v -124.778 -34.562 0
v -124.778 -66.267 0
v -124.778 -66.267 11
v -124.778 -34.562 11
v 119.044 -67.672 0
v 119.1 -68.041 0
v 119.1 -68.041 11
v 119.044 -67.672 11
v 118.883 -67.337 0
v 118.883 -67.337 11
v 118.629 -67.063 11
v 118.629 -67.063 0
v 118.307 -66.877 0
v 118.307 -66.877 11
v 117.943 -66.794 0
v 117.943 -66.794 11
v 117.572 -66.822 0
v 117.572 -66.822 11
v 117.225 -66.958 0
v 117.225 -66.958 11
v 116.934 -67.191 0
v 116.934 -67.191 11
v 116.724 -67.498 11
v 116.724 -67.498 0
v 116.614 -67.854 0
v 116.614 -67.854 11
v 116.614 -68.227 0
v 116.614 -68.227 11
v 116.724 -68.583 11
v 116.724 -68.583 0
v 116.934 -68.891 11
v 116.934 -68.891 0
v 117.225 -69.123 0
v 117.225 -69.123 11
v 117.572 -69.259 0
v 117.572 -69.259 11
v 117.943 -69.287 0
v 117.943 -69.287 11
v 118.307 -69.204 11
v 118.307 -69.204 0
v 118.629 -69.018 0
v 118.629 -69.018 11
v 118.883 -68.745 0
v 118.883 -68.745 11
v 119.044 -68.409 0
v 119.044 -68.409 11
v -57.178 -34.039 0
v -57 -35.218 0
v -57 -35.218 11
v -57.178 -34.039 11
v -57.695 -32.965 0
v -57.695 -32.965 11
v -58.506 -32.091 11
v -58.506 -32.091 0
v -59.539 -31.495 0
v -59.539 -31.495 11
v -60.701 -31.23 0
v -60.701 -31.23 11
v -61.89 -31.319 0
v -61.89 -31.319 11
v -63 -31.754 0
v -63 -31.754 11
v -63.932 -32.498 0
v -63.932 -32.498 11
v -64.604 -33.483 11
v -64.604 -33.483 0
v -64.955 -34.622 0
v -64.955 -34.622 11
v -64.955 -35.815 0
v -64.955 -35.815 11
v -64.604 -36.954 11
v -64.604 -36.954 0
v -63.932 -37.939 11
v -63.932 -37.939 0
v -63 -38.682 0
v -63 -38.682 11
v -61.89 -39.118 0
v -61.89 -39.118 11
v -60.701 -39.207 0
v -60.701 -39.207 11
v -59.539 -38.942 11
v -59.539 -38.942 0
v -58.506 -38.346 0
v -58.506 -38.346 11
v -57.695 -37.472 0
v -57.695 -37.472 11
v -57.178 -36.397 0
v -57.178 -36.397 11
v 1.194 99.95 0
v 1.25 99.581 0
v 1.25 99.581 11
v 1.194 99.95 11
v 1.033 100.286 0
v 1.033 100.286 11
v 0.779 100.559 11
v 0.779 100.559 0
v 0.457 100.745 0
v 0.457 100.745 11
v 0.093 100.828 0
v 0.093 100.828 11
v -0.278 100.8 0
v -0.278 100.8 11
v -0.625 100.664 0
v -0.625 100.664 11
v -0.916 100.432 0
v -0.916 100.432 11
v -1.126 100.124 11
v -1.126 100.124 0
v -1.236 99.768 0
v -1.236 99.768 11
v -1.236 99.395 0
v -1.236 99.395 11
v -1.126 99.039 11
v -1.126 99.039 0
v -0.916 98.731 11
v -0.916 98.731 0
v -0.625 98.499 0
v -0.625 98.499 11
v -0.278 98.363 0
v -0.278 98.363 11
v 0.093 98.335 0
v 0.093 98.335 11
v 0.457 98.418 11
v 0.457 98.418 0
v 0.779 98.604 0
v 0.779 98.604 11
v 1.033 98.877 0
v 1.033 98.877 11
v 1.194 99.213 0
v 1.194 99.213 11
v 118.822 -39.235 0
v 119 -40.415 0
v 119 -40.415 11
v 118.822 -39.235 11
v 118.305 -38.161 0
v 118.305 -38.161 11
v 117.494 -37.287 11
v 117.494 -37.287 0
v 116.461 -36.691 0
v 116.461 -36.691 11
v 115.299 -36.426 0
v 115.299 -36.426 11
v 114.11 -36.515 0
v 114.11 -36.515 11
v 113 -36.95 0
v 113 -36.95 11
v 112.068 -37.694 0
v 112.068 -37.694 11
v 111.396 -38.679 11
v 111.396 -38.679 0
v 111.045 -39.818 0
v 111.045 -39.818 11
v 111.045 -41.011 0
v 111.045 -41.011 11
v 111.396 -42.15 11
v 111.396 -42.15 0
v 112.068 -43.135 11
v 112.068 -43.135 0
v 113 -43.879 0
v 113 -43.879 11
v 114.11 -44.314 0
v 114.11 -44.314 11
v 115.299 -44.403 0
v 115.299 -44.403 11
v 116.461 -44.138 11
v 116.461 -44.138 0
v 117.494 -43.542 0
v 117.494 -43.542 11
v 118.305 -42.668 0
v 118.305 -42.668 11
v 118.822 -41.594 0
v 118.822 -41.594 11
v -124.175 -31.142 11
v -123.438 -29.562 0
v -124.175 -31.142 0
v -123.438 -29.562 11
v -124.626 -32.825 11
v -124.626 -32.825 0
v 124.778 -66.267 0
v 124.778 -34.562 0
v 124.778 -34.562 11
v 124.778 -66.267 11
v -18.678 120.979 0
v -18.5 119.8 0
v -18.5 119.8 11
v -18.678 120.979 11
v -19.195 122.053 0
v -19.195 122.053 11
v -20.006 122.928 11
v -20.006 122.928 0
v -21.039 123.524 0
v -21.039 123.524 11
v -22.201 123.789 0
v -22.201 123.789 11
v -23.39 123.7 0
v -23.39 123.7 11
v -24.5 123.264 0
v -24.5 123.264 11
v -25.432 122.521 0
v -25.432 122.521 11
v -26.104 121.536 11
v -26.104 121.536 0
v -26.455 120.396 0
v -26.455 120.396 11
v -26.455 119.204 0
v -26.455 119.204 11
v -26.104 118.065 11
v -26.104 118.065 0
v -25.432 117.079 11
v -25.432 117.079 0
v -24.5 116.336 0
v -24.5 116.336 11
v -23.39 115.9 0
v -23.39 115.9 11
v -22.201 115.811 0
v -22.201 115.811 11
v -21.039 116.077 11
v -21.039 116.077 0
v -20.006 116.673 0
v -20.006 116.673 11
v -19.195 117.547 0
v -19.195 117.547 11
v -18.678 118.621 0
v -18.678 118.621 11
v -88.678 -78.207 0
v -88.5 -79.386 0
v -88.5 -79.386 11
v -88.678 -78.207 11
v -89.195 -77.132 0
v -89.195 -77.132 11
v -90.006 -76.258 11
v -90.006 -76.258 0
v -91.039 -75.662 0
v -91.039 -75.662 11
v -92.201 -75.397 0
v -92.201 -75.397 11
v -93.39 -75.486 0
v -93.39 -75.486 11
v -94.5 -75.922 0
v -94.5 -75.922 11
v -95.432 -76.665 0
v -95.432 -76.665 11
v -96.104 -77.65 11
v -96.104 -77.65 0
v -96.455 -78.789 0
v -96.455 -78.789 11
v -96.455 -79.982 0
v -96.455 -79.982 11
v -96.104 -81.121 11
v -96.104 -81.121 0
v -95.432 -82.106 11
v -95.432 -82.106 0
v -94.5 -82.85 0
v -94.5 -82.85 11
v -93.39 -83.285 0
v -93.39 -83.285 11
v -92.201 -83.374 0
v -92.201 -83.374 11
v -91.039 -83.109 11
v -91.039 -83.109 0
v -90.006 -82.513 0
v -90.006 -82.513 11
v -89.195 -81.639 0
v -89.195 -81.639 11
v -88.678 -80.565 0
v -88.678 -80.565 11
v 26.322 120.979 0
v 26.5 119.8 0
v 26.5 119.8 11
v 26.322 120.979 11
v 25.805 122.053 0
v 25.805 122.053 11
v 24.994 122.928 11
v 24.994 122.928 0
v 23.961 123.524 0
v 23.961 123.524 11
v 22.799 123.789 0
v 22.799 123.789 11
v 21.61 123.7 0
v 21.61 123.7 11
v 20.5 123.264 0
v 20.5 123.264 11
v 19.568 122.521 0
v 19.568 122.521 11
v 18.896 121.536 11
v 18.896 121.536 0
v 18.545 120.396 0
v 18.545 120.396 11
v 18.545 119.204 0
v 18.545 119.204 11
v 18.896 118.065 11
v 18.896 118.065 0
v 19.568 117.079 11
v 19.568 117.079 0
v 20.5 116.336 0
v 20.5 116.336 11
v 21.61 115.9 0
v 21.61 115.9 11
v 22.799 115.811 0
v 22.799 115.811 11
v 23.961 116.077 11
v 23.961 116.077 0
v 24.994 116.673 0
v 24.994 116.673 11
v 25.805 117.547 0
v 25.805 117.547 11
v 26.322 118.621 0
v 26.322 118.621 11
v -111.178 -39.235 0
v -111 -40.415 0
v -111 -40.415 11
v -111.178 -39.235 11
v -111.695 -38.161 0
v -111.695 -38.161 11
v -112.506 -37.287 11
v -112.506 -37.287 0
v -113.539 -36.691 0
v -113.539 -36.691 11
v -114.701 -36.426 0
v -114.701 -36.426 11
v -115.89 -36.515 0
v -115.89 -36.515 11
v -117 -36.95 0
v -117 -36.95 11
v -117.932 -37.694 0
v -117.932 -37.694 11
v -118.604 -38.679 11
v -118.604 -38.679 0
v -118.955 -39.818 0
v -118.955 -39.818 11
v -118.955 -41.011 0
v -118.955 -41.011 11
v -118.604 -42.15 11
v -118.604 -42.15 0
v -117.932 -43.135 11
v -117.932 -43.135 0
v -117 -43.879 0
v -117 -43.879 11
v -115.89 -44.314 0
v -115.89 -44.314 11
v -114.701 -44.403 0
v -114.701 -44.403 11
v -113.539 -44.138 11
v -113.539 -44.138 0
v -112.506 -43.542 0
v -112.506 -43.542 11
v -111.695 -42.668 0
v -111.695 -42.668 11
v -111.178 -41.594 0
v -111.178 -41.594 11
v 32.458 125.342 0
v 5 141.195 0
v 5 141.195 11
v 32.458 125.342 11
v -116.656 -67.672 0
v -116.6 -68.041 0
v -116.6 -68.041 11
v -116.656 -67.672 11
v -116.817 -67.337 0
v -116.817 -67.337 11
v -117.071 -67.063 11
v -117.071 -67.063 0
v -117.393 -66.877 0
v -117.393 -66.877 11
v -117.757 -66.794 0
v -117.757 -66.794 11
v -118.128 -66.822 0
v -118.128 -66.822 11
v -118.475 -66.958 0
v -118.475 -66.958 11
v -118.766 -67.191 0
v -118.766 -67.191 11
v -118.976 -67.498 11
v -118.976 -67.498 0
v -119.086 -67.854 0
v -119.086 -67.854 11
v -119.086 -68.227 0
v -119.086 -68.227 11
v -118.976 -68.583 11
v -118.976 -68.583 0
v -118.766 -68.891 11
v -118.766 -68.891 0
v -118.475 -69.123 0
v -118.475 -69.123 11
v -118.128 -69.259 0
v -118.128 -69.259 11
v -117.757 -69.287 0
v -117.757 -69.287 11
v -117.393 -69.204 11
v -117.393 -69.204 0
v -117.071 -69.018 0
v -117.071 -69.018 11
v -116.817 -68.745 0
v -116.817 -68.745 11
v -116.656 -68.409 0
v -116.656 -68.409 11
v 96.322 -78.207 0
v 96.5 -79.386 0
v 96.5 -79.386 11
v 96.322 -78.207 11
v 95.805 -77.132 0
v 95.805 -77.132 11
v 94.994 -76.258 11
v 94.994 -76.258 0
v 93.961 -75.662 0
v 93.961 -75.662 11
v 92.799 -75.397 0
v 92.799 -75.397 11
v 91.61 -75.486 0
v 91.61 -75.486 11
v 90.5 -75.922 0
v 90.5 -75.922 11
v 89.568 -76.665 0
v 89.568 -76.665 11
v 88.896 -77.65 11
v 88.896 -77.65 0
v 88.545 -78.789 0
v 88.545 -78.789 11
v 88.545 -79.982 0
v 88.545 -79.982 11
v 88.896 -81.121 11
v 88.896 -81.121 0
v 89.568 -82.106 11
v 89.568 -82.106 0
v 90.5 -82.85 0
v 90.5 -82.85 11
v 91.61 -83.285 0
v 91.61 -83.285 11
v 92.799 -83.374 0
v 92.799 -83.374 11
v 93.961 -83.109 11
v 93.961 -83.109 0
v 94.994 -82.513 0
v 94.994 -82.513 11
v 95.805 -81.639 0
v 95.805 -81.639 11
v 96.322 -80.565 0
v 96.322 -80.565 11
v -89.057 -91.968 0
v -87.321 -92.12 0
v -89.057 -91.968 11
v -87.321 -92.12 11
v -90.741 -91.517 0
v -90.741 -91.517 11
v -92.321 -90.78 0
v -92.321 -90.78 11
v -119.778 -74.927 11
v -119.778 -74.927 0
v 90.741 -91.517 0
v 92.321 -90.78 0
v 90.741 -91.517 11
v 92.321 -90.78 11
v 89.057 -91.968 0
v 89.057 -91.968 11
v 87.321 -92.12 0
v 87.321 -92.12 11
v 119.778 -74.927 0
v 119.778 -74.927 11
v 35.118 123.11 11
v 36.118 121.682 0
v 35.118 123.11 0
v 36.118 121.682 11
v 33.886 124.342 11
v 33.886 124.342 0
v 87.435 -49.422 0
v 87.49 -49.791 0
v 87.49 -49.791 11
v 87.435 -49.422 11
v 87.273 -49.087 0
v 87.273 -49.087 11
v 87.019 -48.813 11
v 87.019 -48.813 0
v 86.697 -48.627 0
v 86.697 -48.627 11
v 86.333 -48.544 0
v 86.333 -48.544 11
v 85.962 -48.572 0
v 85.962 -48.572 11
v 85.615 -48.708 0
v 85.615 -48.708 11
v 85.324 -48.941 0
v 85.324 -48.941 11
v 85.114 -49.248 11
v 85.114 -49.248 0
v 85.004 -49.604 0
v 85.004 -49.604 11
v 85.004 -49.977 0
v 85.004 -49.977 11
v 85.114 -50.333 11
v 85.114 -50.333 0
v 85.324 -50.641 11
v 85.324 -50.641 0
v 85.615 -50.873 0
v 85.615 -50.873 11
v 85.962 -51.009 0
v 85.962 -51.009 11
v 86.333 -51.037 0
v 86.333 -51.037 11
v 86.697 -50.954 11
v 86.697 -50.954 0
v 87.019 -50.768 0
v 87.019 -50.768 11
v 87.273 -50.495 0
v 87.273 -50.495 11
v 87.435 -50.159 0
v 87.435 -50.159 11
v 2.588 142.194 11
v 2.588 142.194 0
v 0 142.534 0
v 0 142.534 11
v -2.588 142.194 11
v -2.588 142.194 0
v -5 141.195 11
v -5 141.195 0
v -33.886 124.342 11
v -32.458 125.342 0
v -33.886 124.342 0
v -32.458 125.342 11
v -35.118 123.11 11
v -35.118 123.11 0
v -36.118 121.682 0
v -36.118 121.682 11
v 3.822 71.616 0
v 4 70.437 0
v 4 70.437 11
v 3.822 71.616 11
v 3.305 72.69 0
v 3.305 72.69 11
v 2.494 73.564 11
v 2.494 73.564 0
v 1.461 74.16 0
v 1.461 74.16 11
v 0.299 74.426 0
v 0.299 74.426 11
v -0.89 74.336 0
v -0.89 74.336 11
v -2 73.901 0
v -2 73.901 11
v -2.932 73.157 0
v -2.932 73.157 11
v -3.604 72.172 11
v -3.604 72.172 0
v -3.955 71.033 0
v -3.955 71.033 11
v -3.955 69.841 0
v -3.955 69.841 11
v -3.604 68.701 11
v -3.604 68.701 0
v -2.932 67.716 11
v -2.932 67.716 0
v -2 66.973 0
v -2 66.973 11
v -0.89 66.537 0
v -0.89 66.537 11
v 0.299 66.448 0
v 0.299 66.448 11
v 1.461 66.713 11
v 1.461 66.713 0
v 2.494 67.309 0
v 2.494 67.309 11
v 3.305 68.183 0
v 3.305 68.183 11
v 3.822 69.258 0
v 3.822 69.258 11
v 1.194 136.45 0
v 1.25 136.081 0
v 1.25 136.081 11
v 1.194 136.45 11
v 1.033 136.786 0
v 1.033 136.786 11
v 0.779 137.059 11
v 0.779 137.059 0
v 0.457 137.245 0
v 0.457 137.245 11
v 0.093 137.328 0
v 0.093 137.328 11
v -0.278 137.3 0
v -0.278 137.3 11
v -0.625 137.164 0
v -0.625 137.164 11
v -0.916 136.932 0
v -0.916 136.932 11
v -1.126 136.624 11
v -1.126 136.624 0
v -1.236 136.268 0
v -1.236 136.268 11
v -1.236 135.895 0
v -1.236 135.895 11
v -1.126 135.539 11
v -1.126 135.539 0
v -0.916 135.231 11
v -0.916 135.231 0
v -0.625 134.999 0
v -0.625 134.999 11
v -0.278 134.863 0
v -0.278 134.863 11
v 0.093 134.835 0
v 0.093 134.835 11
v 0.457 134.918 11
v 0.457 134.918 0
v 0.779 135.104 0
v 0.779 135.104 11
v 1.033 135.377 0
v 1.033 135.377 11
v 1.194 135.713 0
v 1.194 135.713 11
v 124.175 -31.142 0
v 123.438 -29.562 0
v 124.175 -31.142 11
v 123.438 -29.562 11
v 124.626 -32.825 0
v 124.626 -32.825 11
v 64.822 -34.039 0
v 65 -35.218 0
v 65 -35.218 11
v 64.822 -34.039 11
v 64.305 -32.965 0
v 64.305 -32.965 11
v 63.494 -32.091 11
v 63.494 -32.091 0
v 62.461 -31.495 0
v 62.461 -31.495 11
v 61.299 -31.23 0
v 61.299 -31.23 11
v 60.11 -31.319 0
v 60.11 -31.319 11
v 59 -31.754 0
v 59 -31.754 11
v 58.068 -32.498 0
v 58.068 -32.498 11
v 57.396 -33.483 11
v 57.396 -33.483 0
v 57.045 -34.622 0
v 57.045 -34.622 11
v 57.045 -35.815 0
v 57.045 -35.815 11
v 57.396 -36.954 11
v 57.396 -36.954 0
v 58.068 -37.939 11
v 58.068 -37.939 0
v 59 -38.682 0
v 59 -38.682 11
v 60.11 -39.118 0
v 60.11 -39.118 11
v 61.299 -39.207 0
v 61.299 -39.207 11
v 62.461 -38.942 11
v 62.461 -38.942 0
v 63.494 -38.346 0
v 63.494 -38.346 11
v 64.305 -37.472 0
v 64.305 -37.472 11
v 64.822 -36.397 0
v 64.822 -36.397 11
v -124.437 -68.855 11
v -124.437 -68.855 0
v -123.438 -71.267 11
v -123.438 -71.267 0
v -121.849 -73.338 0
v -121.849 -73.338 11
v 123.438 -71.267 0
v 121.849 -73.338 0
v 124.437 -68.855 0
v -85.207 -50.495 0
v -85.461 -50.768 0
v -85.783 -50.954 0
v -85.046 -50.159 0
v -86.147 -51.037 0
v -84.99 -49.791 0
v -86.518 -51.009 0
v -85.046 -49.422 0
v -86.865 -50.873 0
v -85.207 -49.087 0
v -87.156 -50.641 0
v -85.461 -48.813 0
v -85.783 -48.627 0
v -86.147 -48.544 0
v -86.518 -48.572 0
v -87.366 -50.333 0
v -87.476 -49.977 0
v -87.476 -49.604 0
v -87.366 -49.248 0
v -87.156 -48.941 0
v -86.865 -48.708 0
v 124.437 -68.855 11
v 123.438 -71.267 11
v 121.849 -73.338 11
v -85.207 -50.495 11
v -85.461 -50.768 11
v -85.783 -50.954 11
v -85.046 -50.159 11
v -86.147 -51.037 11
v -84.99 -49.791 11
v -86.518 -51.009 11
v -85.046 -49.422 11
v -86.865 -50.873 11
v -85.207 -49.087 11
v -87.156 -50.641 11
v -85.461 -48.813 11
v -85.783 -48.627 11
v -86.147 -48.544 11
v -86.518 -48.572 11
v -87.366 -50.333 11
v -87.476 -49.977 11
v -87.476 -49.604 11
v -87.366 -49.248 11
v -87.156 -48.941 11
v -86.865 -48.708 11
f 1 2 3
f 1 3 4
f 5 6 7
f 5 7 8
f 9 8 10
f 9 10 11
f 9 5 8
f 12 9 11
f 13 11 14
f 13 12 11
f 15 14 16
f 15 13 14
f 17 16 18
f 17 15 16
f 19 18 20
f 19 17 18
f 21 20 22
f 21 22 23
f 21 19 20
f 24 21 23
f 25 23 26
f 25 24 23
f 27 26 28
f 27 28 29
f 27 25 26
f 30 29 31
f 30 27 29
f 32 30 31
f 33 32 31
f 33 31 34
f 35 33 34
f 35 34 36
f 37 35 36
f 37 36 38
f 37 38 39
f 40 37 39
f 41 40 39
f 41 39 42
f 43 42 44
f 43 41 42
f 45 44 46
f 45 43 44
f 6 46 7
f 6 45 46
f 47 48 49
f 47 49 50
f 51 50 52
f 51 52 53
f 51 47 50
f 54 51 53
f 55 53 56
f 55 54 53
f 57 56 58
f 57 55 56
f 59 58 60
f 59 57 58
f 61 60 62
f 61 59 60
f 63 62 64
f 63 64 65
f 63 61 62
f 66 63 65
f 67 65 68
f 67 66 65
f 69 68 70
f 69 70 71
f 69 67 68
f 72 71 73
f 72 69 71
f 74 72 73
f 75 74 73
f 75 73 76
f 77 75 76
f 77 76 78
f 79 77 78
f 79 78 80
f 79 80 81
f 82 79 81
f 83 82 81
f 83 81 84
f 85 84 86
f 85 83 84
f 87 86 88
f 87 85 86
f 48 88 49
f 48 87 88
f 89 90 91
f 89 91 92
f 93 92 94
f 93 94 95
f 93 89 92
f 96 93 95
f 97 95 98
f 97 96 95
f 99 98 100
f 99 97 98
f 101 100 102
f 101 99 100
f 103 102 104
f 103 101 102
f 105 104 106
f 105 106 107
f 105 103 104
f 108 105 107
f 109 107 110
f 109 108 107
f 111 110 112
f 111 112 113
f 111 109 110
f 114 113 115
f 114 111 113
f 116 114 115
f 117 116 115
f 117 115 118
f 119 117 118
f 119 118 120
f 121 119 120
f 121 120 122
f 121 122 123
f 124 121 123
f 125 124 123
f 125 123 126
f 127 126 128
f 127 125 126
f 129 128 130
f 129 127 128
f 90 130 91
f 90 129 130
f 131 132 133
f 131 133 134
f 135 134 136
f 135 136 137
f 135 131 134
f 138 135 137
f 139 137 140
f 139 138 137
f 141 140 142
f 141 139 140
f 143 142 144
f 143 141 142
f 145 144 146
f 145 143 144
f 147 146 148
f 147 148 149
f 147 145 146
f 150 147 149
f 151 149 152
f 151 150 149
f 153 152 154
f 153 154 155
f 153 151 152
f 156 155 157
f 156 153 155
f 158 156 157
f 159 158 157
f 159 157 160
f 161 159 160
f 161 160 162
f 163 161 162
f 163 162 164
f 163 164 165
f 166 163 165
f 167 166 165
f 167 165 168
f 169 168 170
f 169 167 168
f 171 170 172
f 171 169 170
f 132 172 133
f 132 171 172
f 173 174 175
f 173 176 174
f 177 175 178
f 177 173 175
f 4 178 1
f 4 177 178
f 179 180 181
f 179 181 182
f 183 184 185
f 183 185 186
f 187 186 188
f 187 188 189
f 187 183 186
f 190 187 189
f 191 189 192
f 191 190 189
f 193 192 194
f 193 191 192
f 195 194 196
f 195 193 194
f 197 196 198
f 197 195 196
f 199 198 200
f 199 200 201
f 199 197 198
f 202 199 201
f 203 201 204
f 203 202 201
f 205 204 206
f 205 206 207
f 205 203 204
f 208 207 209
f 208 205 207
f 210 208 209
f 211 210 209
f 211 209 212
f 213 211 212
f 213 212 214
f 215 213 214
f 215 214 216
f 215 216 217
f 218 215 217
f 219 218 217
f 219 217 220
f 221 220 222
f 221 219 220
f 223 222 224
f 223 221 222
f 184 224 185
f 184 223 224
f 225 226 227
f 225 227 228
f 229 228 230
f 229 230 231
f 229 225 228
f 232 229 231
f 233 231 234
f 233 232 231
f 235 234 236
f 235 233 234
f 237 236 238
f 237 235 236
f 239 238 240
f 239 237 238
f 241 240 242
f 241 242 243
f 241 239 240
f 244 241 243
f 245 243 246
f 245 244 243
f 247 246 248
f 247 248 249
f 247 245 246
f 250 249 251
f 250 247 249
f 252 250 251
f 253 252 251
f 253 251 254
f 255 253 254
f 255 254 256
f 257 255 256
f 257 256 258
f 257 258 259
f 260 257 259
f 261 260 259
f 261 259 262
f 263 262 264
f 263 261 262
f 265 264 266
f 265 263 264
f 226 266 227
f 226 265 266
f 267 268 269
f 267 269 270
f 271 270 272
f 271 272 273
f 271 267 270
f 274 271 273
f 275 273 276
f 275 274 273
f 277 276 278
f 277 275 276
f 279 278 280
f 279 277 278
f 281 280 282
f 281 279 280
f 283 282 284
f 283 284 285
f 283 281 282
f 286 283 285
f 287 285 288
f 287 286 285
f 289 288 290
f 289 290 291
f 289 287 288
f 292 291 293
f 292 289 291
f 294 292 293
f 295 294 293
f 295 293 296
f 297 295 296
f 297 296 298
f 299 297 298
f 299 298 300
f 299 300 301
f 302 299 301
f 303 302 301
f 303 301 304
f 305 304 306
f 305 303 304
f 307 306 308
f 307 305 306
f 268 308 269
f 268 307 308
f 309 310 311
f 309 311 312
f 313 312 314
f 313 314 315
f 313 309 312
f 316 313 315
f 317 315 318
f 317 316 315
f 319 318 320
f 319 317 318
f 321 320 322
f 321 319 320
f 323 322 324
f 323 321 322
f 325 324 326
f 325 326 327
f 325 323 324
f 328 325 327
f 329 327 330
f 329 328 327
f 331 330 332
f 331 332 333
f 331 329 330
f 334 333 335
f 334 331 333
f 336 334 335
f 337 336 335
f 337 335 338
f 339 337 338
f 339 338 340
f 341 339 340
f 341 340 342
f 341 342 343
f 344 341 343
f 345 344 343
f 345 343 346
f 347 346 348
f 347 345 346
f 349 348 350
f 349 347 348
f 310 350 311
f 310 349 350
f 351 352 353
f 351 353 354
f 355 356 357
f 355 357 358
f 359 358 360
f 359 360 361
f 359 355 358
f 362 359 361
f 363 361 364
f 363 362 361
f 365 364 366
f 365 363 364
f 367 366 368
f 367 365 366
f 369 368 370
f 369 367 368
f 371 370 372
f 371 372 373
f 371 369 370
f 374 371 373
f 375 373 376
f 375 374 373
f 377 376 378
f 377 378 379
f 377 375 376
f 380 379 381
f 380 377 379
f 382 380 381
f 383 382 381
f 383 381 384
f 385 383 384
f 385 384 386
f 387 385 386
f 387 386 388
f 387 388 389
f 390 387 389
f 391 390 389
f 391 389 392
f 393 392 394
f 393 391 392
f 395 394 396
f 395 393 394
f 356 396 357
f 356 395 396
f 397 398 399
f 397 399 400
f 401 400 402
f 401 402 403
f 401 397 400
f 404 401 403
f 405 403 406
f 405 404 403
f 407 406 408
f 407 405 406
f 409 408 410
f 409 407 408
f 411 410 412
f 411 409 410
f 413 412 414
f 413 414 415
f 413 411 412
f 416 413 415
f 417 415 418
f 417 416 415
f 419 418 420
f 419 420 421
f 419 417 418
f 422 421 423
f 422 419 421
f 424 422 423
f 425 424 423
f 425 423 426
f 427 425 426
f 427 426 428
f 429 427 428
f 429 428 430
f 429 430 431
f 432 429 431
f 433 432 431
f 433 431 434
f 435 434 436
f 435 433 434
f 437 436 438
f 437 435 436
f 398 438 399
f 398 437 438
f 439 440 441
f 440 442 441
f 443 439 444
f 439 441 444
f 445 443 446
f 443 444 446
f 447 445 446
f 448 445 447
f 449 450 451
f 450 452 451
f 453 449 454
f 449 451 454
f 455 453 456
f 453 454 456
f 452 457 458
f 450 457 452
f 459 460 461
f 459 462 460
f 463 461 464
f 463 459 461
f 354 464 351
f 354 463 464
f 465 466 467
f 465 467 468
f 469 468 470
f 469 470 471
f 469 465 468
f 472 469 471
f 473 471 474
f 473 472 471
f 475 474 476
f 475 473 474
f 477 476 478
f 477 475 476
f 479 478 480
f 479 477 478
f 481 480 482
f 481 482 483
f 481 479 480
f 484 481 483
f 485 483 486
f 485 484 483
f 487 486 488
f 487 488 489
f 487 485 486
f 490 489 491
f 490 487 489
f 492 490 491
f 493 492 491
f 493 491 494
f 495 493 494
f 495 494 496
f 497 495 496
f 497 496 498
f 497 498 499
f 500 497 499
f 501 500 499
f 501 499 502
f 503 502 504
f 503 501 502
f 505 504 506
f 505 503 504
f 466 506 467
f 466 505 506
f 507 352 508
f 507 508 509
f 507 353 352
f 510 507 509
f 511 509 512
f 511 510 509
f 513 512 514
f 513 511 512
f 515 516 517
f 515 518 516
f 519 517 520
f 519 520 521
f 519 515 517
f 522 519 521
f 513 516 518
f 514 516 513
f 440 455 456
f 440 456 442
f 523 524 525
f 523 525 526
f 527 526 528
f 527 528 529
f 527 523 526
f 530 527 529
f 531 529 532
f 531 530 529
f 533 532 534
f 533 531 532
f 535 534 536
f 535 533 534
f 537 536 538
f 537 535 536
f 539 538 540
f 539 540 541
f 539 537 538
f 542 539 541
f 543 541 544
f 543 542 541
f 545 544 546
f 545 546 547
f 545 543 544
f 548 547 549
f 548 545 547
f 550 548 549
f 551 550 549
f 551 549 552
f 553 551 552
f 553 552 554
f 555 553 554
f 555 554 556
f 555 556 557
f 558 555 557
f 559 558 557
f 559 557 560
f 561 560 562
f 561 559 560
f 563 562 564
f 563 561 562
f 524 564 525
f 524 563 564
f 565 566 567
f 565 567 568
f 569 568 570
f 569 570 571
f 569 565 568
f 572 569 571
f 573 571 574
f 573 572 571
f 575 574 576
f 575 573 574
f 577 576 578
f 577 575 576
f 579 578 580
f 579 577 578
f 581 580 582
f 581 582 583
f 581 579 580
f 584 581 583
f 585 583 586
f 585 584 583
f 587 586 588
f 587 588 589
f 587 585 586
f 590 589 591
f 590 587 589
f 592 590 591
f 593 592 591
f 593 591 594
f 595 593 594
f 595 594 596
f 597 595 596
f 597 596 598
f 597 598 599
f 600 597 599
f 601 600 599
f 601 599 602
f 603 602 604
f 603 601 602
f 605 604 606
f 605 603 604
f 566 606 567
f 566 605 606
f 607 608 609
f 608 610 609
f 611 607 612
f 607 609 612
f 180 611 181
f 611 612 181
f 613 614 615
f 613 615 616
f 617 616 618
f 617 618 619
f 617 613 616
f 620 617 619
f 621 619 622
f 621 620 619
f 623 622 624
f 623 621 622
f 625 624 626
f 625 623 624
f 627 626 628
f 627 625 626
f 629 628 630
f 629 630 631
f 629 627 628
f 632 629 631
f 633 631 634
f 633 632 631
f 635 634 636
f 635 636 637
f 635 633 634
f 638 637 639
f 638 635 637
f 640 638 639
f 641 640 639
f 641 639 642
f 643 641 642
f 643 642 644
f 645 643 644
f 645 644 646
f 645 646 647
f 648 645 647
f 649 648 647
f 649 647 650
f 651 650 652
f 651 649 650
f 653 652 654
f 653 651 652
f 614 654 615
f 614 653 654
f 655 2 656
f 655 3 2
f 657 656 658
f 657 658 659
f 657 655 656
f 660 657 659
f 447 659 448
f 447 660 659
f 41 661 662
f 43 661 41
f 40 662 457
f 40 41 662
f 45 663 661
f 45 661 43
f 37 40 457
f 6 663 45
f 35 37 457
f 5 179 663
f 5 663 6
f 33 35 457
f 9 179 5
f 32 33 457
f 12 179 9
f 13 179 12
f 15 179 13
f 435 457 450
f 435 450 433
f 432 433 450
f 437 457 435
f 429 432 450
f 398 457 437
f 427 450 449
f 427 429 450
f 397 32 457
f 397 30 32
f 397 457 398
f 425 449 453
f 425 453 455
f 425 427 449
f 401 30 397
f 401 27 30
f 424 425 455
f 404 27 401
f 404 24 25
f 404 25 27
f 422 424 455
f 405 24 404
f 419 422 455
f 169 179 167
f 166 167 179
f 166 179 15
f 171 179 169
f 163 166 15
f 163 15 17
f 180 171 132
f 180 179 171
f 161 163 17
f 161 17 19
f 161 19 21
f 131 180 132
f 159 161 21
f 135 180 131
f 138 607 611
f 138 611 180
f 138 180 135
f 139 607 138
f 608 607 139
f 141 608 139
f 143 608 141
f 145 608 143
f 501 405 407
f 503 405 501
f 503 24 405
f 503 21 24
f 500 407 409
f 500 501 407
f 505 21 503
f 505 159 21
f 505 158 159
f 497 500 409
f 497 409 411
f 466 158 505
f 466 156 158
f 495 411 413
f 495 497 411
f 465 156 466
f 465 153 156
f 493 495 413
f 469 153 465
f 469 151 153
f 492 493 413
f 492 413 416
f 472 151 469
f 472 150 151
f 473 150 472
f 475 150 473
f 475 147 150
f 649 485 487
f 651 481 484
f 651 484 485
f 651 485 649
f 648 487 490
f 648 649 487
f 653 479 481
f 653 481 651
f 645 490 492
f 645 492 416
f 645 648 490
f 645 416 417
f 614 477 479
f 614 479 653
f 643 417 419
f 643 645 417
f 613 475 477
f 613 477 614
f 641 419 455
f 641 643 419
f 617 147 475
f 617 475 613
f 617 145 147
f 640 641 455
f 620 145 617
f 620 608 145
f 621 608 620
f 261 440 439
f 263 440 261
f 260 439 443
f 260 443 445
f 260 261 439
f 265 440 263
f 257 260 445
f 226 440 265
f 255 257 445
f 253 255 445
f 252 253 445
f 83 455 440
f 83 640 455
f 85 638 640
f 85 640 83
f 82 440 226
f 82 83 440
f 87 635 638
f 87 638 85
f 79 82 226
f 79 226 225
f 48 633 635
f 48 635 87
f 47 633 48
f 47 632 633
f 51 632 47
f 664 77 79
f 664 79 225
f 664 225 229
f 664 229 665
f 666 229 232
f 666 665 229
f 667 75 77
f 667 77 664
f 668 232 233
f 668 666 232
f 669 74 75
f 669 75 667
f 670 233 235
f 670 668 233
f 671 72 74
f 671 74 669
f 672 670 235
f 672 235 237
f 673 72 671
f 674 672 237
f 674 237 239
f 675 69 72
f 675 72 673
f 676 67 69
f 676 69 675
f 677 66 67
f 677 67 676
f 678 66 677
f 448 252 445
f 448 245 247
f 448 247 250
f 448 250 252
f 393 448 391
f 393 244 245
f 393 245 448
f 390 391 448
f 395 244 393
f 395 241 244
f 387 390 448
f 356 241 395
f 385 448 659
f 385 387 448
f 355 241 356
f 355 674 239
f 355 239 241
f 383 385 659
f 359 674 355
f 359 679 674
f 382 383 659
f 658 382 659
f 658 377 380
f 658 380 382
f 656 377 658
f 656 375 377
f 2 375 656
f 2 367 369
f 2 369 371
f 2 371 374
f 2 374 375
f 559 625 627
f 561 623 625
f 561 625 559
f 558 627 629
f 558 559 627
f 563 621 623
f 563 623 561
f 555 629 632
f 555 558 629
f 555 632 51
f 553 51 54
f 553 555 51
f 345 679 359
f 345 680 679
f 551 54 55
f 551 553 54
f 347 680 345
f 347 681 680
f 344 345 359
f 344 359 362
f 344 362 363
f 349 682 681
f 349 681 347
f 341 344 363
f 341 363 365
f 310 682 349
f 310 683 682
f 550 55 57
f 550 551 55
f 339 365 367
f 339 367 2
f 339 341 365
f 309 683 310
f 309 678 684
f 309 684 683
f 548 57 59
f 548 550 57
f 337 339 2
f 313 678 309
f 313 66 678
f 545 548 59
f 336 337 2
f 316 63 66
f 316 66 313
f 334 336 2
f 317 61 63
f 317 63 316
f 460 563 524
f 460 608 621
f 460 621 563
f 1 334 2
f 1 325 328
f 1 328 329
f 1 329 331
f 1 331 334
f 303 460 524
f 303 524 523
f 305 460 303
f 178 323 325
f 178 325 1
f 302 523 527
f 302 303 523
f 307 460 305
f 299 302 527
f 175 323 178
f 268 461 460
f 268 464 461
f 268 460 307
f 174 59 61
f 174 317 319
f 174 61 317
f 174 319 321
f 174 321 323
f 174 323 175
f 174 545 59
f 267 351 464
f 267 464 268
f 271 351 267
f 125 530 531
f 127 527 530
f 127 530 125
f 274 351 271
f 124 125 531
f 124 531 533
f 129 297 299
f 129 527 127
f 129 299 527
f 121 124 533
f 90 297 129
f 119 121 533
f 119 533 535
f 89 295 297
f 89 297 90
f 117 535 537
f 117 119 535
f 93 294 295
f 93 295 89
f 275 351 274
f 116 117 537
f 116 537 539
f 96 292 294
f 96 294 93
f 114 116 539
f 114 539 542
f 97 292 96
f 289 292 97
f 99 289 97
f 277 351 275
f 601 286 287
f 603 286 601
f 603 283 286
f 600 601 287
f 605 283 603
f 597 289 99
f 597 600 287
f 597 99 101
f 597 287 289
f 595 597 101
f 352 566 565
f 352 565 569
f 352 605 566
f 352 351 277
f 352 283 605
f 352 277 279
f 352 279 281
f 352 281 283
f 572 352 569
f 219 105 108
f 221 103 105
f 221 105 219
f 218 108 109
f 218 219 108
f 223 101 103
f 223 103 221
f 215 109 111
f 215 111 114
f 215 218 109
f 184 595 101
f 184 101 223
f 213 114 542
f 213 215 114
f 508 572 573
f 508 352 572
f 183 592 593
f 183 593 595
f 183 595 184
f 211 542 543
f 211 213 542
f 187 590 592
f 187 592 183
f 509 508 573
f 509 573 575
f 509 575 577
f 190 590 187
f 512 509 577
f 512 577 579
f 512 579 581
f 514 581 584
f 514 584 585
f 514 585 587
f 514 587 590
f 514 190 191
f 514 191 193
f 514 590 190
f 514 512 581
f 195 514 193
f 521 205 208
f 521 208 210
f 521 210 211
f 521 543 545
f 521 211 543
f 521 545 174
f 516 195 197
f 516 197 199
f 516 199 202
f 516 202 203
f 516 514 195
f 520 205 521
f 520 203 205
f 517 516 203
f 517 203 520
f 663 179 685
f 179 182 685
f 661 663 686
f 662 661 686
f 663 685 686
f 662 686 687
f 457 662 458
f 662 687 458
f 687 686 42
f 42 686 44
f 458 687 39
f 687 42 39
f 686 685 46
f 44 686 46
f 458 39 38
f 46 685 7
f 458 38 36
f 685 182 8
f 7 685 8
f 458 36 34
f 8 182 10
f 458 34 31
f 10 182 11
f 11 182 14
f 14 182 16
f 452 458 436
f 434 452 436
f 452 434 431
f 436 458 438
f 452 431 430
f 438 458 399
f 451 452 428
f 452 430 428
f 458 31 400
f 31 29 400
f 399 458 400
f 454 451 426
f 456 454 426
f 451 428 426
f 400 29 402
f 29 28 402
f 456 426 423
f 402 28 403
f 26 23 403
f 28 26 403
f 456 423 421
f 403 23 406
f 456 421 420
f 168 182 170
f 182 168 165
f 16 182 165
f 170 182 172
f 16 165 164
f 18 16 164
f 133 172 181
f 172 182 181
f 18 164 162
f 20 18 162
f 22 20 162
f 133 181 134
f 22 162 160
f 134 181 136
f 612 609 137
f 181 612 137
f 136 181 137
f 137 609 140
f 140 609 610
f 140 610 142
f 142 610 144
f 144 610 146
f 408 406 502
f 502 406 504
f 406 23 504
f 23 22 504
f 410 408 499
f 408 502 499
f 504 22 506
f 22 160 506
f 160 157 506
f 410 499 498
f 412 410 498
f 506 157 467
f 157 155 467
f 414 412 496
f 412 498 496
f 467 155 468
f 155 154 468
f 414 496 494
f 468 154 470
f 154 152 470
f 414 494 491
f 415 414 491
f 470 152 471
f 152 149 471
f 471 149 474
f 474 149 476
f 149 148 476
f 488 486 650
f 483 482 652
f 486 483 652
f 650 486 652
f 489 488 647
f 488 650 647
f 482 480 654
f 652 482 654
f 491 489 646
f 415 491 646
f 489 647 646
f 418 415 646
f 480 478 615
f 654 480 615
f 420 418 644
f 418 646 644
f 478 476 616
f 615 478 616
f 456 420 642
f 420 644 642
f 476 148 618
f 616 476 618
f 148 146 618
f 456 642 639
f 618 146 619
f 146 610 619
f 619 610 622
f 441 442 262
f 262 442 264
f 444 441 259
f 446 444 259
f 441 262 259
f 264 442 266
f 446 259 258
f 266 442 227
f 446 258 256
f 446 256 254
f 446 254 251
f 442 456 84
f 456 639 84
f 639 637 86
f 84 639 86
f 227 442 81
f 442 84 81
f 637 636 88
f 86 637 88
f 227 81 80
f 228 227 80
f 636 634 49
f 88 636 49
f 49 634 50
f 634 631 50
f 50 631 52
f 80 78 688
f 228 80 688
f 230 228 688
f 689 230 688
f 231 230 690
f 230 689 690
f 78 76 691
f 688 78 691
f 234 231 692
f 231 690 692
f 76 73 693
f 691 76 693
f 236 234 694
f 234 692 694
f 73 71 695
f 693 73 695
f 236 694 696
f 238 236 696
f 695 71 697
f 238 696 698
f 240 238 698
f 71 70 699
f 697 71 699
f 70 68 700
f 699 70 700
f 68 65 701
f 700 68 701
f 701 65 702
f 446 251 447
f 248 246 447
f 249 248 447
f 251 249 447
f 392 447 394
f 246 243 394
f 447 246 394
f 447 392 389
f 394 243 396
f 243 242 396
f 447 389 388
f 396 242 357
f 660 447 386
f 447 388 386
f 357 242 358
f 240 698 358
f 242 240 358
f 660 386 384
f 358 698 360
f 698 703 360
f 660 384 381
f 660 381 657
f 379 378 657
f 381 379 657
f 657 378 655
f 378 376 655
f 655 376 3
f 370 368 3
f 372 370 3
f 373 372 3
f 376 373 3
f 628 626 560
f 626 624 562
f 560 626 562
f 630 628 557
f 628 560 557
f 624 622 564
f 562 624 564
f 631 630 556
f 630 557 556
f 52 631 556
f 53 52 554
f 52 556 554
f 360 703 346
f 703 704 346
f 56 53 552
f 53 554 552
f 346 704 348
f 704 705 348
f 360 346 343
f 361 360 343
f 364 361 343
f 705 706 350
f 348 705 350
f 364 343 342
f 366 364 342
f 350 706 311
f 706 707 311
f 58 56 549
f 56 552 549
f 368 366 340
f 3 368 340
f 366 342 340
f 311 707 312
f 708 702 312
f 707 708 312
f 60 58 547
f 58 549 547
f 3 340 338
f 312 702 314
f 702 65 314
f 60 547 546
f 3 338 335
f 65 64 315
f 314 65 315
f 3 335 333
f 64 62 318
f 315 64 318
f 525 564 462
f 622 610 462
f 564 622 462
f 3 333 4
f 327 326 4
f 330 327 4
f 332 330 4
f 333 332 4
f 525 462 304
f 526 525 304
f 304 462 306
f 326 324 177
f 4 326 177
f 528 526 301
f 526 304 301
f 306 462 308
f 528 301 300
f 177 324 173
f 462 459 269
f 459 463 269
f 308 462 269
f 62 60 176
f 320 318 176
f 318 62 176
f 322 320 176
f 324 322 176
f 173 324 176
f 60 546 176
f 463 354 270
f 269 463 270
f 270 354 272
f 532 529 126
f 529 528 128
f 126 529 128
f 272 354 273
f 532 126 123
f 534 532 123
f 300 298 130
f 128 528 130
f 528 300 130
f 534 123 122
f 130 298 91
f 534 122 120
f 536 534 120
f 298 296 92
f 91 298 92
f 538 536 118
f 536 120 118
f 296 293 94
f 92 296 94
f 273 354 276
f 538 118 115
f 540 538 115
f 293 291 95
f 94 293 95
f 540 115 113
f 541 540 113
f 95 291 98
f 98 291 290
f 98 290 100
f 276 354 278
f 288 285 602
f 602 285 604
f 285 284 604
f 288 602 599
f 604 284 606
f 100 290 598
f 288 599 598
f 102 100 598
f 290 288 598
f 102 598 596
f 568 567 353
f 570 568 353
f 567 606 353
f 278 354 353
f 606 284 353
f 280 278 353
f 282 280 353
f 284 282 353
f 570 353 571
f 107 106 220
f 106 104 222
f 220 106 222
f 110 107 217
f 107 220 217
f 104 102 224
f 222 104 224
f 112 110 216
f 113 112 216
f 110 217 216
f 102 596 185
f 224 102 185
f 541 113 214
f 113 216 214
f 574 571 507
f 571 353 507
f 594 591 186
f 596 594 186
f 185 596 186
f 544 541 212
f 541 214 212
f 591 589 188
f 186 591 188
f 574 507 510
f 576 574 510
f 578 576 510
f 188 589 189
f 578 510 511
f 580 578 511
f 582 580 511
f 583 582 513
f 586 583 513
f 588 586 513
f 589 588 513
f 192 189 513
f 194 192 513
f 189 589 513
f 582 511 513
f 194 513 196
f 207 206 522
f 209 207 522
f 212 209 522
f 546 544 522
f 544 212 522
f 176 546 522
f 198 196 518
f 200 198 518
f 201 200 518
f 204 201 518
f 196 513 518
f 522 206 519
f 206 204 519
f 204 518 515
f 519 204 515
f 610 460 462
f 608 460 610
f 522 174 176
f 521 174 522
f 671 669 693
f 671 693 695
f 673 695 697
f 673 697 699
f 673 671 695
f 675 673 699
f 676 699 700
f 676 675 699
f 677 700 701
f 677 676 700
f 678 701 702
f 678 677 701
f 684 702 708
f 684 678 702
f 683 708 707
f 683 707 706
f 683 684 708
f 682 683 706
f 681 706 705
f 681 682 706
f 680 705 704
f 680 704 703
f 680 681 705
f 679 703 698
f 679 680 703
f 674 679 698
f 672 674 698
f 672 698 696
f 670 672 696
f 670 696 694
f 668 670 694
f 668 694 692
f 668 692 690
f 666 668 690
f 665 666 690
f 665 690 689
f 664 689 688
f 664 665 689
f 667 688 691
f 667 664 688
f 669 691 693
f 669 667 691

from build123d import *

# Parameters (mm, degrees)
ESQUISSE1_R        = 1.25
ESQUISSE1_R_2      = 4
BOSS_EXTRU_1_DEPTH = 11
CONG_1_R           = 10


with BuildPart() as part:
    # Esquisse1 → Boss.-Extru.1 (new body)
    with BuildSketch(Plane.XY):
        Polygon((34.77820323, 124.002253451), (124.77820323, -31.88231923), (124.77820323, -72.040729224), (90, -92.119934221), (-90, -92.119934221), (-124.77820323, -72.040729224), (-124.77820323, -31.88231923), (-34.77820323, 124.002253451), (0, 144.081458448), align=None)
        with Locations((-117.85, -68.040729224)):
            Circle(ESQUISSE1_R, mode=Mode.SUBTRACT)
        with Locations((117.85, -68.040729224)):
            Circle(ESQUISSE1_R, mode=Mode.SUBTRACT)
        with Locations((0, 136.081458448)):
            Circle(ESQUISSE1_R, mode=Mode.SUBTRACT)
        with Locations((-86.240072762, -49.790729224)):
            Circle(ESQUISSE1_R, mode=Mode.SUBTRACT)
        with Locations((0, 99.581458448)):
            Circle(ESQUISSE1_R, mode=Mode.SUBTRACT)
        with Locations((86.240072762, -49.790729224)):
            Circle(ESQUISSE1_R, mode=Mode.SUBTRACT)
        with Locations((-61, -35.218366421)):
            Circle(ESQUISSE1_R_2, mode=Mode.SUBTRACT)
        with Locations((0, 70.436732841)):
            Circle(ESQUISSE1_R_2, mode=Mode.SUBTRACT)
        with Locations((61, -35.218366421)):
            Circle(ESQUISSE1_R_2, mode=Mode.SUBTRACT)
        with Locations((22.5, 119.800180857)):
            Circle(ESQUISSE1_R_2, mode=Mode.SUBTRACT)
        with Locations((-22.5, 119.800180857)):
            Circle(ESQUISSE1_R_2, mode=Mode.SUBTRACT)
        with Locations((-115, -40.414518843)):
            Circle(ESQUISSE1_R_2, mode=Mode.SUBTRACT)
        with Locations((-92.5, -79.385662014)):
            Circle(ESQUISSE1_R_2, mode=Mode.SUBTRACT)
        with Locations((92.5, -79.385662014)):
            Circle(ESQUISSE1_R_2, mode=Mode.SUBTRACT)
        with Locations((115, -40.414518843)):
            Circle(ESQUISSE1_R_2, mode=Mode.SUBTRACT)
    extrude(amount=BOSS_EXTRU_1_DEPTH)

    # Congé1
    cong_1_edges = [part.edges().sort_by_distance(p)[0] for p in [
        (34.77820323, 124.002253451, 5.5),
        (124.77820323, -31.88231923, 5.5),
        (124.77820323, -72.040729224, 5.5),
        (90, -92.119934221, 5.5),
        (-90, -92.119934221, 5.5),
        (-124.77820323, -72.040729224, 5.5),
        (-124.77820323, -31.88231923, 5.5),
        (-34.77820323, 124.002253451, 5.5),
        (0, 144.081458448, 5.5),
    ]]
    fillet(cong_1_edges, radius=CONG_1_R)


solid = part.part
